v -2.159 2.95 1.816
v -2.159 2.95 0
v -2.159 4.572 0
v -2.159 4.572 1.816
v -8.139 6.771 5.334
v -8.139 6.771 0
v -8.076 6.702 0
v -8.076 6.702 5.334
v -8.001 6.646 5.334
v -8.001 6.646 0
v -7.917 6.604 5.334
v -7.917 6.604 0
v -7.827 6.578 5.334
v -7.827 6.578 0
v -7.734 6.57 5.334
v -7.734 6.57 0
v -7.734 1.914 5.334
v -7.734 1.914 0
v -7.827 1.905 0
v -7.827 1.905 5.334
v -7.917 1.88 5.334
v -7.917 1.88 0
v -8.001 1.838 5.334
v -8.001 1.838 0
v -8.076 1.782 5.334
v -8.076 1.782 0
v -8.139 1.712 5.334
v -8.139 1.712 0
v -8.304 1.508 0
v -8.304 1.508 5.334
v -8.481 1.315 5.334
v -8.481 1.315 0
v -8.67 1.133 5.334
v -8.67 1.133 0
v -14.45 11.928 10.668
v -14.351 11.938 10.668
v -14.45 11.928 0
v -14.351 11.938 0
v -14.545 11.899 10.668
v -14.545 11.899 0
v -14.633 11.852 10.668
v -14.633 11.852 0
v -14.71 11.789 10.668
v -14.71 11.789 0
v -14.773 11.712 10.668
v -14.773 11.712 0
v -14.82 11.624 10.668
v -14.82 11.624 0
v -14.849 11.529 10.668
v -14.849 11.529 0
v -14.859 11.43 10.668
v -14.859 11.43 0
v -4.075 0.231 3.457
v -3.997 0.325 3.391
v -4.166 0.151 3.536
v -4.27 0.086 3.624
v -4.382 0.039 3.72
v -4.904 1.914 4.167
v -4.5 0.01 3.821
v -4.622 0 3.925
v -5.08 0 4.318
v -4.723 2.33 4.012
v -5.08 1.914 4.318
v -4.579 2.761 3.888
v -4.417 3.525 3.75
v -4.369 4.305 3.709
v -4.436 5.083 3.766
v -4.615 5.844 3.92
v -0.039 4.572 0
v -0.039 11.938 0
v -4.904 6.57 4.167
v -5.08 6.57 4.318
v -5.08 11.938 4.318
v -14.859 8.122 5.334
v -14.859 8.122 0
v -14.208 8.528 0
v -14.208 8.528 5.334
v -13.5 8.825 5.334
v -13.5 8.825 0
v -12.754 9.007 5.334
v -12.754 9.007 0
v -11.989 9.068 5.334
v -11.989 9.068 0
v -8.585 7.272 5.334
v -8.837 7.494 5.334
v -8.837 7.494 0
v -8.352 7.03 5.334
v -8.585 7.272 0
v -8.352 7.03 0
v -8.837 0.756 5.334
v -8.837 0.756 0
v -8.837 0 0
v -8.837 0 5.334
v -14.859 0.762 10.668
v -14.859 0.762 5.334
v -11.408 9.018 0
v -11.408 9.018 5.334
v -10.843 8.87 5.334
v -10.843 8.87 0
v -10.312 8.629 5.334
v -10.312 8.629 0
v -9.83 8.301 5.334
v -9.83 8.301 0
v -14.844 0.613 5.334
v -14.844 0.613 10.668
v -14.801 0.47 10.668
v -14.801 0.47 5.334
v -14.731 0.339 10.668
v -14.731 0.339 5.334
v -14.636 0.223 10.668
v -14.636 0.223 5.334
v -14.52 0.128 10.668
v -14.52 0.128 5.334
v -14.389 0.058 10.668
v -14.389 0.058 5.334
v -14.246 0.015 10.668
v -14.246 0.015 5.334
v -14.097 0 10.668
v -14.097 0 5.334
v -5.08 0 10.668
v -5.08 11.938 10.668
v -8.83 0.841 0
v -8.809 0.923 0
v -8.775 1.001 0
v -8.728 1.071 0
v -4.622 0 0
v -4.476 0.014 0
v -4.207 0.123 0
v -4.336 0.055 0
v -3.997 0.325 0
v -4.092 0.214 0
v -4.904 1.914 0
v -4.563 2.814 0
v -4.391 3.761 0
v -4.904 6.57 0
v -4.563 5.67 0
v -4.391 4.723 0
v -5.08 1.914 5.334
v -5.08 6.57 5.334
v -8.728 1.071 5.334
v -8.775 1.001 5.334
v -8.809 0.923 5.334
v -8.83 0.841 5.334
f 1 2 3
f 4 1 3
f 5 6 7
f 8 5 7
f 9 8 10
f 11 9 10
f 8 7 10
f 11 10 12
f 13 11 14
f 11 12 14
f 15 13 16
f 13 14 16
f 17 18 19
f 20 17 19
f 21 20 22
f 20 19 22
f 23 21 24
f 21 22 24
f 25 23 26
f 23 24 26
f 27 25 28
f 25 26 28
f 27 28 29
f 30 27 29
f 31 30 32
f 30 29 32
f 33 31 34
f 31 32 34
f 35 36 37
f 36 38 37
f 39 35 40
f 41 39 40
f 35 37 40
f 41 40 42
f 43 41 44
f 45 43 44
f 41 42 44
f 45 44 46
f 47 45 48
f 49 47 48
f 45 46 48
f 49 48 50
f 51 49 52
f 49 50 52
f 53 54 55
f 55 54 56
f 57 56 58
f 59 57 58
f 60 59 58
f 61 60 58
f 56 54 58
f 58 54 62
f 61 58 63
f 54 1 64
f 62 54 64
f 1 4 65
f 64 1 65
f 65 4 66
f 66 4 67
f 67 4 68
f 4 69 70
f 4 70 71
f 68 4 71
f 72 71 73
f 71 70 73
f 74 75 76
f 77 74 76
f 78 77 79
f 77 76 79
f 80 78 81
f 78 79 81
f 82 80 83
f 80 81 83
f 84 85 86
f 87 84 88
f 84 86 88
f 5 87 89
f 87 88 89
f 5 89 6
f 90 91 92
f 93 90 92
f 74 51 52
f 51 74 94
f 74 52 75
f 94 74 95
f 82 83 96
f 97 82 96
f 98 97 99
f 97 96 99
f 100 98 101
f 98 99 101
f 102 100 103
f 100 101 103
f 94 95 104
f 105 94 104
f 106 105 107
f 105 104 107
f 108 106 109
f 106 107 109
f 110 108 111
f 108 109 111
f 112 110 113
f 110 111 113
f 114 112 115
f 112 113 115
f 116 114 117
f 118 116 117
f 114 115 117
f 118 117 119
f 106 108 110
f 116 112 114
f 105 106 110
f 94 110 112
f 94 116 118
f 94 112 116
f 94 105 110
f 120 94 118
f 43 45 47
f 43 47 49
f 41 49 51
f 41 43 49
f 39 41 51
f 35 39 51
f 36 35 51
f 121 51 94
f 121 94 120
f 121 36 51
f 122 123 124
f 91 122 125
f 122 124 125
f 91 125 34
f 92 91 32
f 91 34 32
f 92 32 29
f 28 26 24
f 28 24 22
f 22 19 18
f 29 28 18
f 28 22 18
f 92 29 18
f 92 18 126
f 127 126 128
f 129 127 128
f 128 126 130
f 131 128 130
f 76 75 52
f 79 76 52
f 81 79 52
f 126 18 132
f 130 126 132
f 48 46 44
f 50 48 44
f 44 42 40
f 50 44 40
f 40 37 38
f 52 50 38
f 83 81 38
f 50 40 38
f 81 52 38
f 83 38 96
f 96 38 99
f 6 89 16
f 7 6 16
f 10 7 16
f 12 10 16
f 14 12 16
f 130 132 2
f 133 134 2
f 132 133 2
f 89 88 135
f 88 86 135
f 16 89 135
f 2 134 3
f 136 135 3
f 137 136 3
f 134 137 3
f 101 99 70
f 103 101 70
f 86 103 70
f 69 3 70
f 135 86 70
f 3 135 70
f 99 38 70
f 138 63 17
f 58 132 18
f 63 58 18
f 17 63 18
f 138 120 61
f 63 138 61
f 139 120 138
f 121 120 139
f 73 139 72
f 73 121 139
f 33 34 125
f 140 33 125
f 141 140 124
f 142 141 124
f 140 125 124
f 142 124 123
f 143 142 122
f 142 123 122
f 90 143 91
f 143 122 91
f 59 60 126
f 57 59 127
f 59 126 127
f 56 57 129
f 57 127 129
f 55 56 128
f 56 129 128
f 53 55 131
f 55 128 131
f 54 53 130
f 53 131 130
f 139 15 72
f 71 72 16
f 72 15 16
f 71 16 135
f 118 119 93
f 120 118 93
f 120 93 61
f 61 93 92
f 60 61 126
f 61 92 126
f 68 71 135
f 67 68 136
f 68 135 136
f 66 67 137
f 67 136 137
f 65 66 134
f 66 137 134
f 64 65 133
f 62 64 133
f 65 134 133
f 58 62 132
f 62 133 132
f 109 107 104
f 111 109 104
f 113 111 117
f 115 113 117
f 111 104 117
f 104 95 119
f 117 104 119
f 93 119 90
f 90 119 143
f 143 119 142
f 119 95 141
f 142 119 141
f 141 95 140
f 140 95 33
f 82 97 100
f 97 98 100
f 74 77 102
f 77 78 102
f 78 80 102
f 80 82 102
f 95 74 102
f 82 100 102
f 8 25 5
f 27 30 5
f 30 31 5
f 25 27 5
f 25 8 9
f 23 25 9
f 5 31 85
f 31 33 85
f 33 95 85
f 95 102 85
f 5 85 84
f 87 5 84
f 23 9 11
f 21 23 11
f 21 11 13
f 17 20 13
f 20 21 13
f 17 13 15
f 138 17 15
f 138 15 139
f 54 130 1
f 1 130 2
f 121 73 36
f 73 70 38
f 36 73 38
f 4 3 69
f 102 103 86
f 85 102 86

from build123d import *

# Parameters (mm, degrees)
EXTRUDE1_DEPTH          = 4.7752
EXTRUDE2_DEPTH          = 12.938
SKETCH33_W              = 2.286
SKETCH33_H              = 5.588
EXTRUDE30_DEPTH         = 10.668
EXTRUDE3_DEPTH          = 3.0988
EXTRUDE6_DEPTH          = 3.0988
EXTRUDE7_DEPTH          = 3.0988
SKETCH23_W              = 3.0988
SKETCH23_H              = 1.133450424
EXTRUDE20_DEPTH         = 2.54
EXTRUDE16_DEPTH         = 3.0988
FILLET1_R               = 0.762
EXTRUDE21_DEPTH         = 3.0988
FILLET2_R               = 0.762
EXTRUDE28_DEPTH         = 8.0612
EXTRUDE29_REACH         = 9.061
FILLET3_R               = 0.762
FILLET4_R               = 0.508
FILLET5_R               = 0.508
FILLET6_R               = 0.508
SKETCH35_R              = 1.016
EXTRUDE32_DEPTH         = 8.0612
BOSS_EXTRUDE1_DEPTH     = 5.334
BOSS_EXTRUDE2_DEPTH     = 5.334
SKETCH39_W              = 7.76878052
SKETCH39_H              = 12.502157979
CUT_EXTRUDE1_DEPTH      = 15.8590001
SKETCH40_W              = 5.041406472
SKETCH40_H              = 6.35
SKETCH40_W_2            = 0.038593528
SKETCH40_H_2            = 4.318
CUT_EXTRUDE2_DEPTH      = 1.0000001
CUT_EXTRUDE2_DEPTH_BACK = 12.9380001


with BuildPart() as part:
    # Sketch1 → Extrude1 (new body)
    with BuildSketch(Plane.XY):
        Polygon((-14.859, 11.938), (0, 11.938), (0, 4.572), (-3.175, 4.572), (-3.175, 0), (-14.859, 0), align=None)
    extrude(amount=-EXTRUDE1_DEPTH)

    # Sketch2 → Extrude2 (cut, through all)
    with BuildSketch(Plane(origin=(0, 11.938, 0), x_dir=(1, 0, 0), z_dir=(0, 1, 0))):
        Polygon((0, 0.5842), (-4.191, 4.7752), (0, 4.7752), align=None)
    extrude(amount=-EXTRUDE2_DEPTH, mode=Mode.SUBTRACT)

    # Sketch33 → Extrude30 (add)
    with BuildSketch(Plane.ZY.offset(14.859)):
        with Locations((-5.9182, 9.144)):
            Rectangle(SKETCH33_W, SKETCH33_H)
    extrude(amount=-EXTRUDE30_DEPTH)

    # Sketch5 → Extrude3 (cut)
    with BuildSketch(Plane.XY):
        with BuildLine():
            Line((-14.859, 8.121520088), (-14.859, 0))
            Line((-14.859, 0), (-8.374207602, 0))
            ThreePointArc((-8.374207602, 0), (-5.258197931, 4.182323512), (-8.261178378, 8.44652973))
            ThreePointArc((-8.261178378, 8.44652973), (-10.099280239, 8.911418564), (-11.9888, 9.0678))
            ThreePointArc((-11.9888, 9.0678), (-13.499883528, 8.825128765), (-14.859, 8.121520088))
        make_face()
    extrude(amount=-EXTRUDE3_DEPTH, mode=Mode.SUBTRACT)

    # Sketch8 → Extrude6 (add)
    with BuildSketch(Plane.XY):
        with BuildLine():
            Line((-5.916117419, 6.569687461), (-7.995771884, 6.569687461))
            ThreePointArc((-7.995771884, 6.569687461), (-8.381805974, 7.063274265), (-8.837117419, 7.493787609))
            Line((-8.837117419, 7.493787609), (-8.837117419, 8.601687461))
            ThreePointArc((-8.837117419, 8.601687461), (-7.16441835, 7.890723622), (-5.916117419, 6.569687461))
        make_face()
    extrude(amount=-EXTRUDE6_DEPTH)

    # Sketch9 → Extrude7 (add)
    with BuildSketch(Plane.XY):
        with BuildLine():
            Line((-5.916117419, 1.913912539), (-7.995771884, 1.913912539))
            ThreePointArc((-7.995771884, 1.913912539), (-8.381805974, 1.420325735), (-8.837117419, 0.989812391))
            Line((-8.837117419, 0.989812391), (-8.837117419, 0))
            Line((-8.837117419, 0), (-8.374207602, 0))
            ThreePointArc((-8.374207602, 0), (-6.971998867, 0.734557469), (-5.916117419, 1.913912539))
        make_face()
    extrude(amount=-EXTRUDE7_DEPTH)

    # Sketch23 → Extrude20 (add)
    with BuildSketch(Plane.ZY.offset(8.837117419)):
        with Locations((-1.5494, 8.060512821)):
            Rectangle(SKETCH23_W, SKETCH23_H)
    extrude(amount=-EXTRUDE20_DEPTH)

    # Sketch18 → Extrude16 (cut)
    with BuildSketch(Plane.XY):
        with BuildLine():
            Line((-4.903581733, 6.569687461), (-5.916117419, 6.569687461))
            ThreePointArc((-5.916117419, 6.569687461), (-5.2578, 4.2418), (-5.916117419, 1.913912539))
            Line((-5.916117419, 1.913912539), (-4.903581733, 1.913912539))
            ThreePointArc((-4.903581733, 1.913912539), (-4.3688, 4.2418), (-4.903581733, 6.569687461))
        make_face()
    extrude(amount=-EXTRUDE16_DEPTH, mode=Mode.SUBTRACT)

    # Fillet1
    fillet1_edges = [part.edges().sort_by_distance(p)[0] for p in [
        (0, 8.255, -0.5842),
    ]]
    fillet(fillet1_edges, radius=FILLET1_R)

    # Sketch24 → Extrude21 (add)
    with BuildSketch(Plane.XY):
        with BuildLine():
            Line((-8.837117419, 7.493787609), (-9.830149409, 8.301066631))
            ThreePointArc((-9.830149409, 8.301066631), (-10.843412246, 8.870424655), (-11.9888, 9.0678))
            Line((-11.9888, 9.0678), (-8.837117419, 9.0678))
            Line((-8.837117419, 9.0678), (-8.837117419, 7.493787609))
        make_face()
    extrude(amount=-EXTRUDE21_DEPTH)

    # Fillet2
    fillet2_edges = [part.edges().sort_by_distance(p)[0] for p in [
        (-14.859, 0, -3.937),
    ]]
    fillet(fillet2_edges, radius=FILLET2_R)

    # Sketch31 → Extrude28 (cut, through all)
    with BuildSketch(Plane.XY):
        Polygon((-3.175, 1.499352844), (-4.224858164, 0), (-3.175, 0), align=None)
    extrude(amount=-EXTRUDE28_DEPTH, mode=Mode.SUBTRACT)

    # Extrude29: up to this face of the body (flat: up to its plane)
    extrude29_end = Plane(part.part.faces().sort_by_distance((-2.383005057, 7.601249614, -2.967205057))[0])
    # Sketch32 → Extrude29 (add, up to the picked face)
    with BuildSketch(Plane.XY, mode=Mode.PRIVATE) as extrude29_sk1:
        Polygon((-3.175, 1.499352844), (-2.159, 2.950351219), (-2.159, 4.572), (-3.175, 4.572), align=None)
    extrude29_tool1 = split(extrude(extrude29_sk1.sketch, amount=-EXTRUDE29_REACH, mode=Mode.PRIVATE), bisect_by=extrude29_end, keep=Keep.BOTH, mode=Mode.PRIVATE)
    add(extrude29_tool1.solids().sort_by_distance((-2.719341, 3.361051, 0))[0])

    # Fillet3
    fillet3_edges = [part.edges().sort_by_distance(p)[0] for p in [
        (-4.224858164, 0, -2.3876),
    ]]
    fillet(fillet3_edges, radius=FILLET3_R)

    # Fillet4
    fillet4_edges = [part.edges().sort_by_distance(p)[0] for p in [
        (-3.078168199, 1.637642987, 0),
        (-4.269677813, 0.086097745, 0),
        (-6.729323838, 0, 0),
    ]]
    fillet(fillet4_edges, radius=FILLET4_R)

    # Fillet5
    fillet5_edges = [part.edges().sort_by_distance(p)[0] for p in [
        (-9.525, 11.938, -7.0612),
        (-9.525, 6.35, -7.0612),
        (-7.4295, 11.938, 0),
        (-14.859, 11.938, -3.5306),
    ]]
    fillet(fillet5_edges, radius=FILLET5_R)

    # Fillet6
    fillet6_edges = [part.edges().sort_by_distance(p)[0] for p in [
        (-7.995771884, 6.569687461, -1.5494),
        (-8.837117419, 0.989812391, -1.5494),
        (-7.995771884, 1.913912539, -1.5494),
    ]]
    fillet(fillet6_edges, radius=FILLET6_R)

    # Sketch35 → Extrude32 (cut, through all)
    with BuildSketch(Plane.XY):
        with Locations((-6.731, 8.763)):
            Circle(SKETCH35_R)
    extrude(amount=-EXTRUDE32_DEPTH, mode=Mode.SUBTRACT)

    # Sketch37 → Boss-Extrude1 (add)
    with BuildSketch(Plane.XY):
        with BuildLine():
            Line((-8.837117419, 0.508), (-8.837117419, 0))
            Line((-8.837117419, 0), (-4.621530256, 0))
            ThreePointArc((-4.621530256, 0), (-4.269677813, 0.086097745), (-3.997336399, 0.324934756))
            Line((-3.997336399, 0.324934756), (-2.159, 2.950351219))
            Line((-2.159, 2.950351219), (-2.159, 3.836022191))
            Line((-2.159, 3.836022191), (-2.159, 4.572))
            Line((-2.159, 4.572), (0, 4.572))
            Line((0, 4.572), (0, 11.43))
            Line((0, 11.43), (0, 11.878036743))
            add(Edge.make_bspline(
                [(0, 11.878036743), (0, 11.918150491), (-0.011858122, 11.938), (-0.038593528, 11.938)],
                knots=[0, 0, 0, 0, 1, 1, 1, 1], degree=3))
            Line((-0.038593528, 11.938), (-14.351, 11.938))
            ThreePointArc((-14.351, 11.938), (-14.710210245, 11.789210245), (-14.859, 11.43))
            Line((-14.859, 11.43), (-14.859, 8.121520088))
            ThreePointArc((-14.859, 8.121520088), (-13.499883528, 8.825128765), (-11.9888, 9.0678))
            ThreePointArc((-11.9888, 9.0678), (-10.843412246, 8.870424655), (-9.830149409, 8.301066631))
            Line((-9.830149409, 8.301066631), (-8.837117419, 7.493787609))
            ThreePointArc((-8.837117419, 7.493787609), (-8.466362979, 7.153440508), (-8.139079327, 6.771105032))
            ThreePointArc((-8.139079327, 6.771105032), (-7.96020818, 6.622820517), (-7.734022276, 6.569687461))
            Line((-7.734022276, 6.569687461), (-4.903581733, 6.569687461))
            ThreePointArc((-4.903581733, 6.569687461), (-4.3688, 4.2418), (-4.903581733, 1.913912539))
            Line((-4.903581733, 1.913912539), (-7.734022276, 1.913912539))
            ThreePointArc((-7.734022276, 1.913912539), (-7.96020818, 1.860779483), (-8.139079327, 1.712494968))
            ThreePointArc((-8.139079327, 1.712494968), (-8.390857142, 1.410416216), (-8.66983986, 1.133265926))
            ThreePointArc((-8.66983986, 1.133265926), (-8.793418506, 0.962601304), (-8.837117419, 0.756473917))
            Line((-8.837117419, 0.756473917), (-8.837117419, 0.508))
        make_face()
    extrude(amount=BOSS_EXTRUDE1_DEPTH)

    # Sketch38 → Boss-Extrude2 (add)
    with BuildSketch(Plane.XY.offset(5.334)):
        with BuildLine():
            Line((-0.038593528, 11.938), (-14.351, 11.938))
            ThreePointArc((-14.351, 11.938), (-14.710210245, 11.789210245), (-14.859, 11.43))
            Line((-14.859, 11.43), (-14.859, 0.762))
            ThreePointArc((-14.859, 0.762), (-14.635815367, 0.223184633), (-14.097, 0))
            Line((-14.097, 0), (-4.621530256, 0))
            ThreePointArc((-4.621530256, 0), (-4.269677813, 0.086097745), (-3.997336399, 0.324934756))
            Line((-3.997336399, 0.324934756), (-2.159, 2.950351219))
            Line((-2.159, 2.950351219), (-2.159, 4.572))
            Line((-2.159, 4.572), (0, 4.572))
            Line((0, 4.572), (0, 11.878036743))
            add(Edge.make_bspline(
                [(0, 11.878036743), (0, 11.918150491), (-0.011858122, 11.938), (-0.038593528, 11.938)],
                knots=[0, 0, 0, 0, 1, 1, 1, 1], degree=3))
        make_face()
    extrude(amount=BOSS_EXTRUDE2_DEPTH)

    # Sketch39 → Cut-Extrude1 (cut, through all)
    with BuildSketch(Plane.ZY.offset(14.859)):
        with Locations((-3.88439026, 6.25107899)):
            Rectangle(SKETCH39_W, SKETCH39_H)
    extrude(amount=-CUT_EXTRUDE1_DEPTH, mode=Mode.SUBTRACT)

    # Sketch40 → Cut-Extrude2 (cut, two sides)
    with BuildSketch(Plane(origin=(0, 11.938, 0), x_dir=(1, 0, 0), z_dir=(0, 1, 0))) as cut_extrude2_sk:
        Polygon((-0.038593528, 0), (-5.08, -4.318), (-0.038593528, -4.318), align=None)
        with Locations((-2.559296764, -7.493)):
            Rectangle(SKETCH40_W, SKETCH40_H)
        with Locations((-0.019296764, -2.159)):
            Rectangle(SKETCH40_W_2, SKETCH40_H_2)
        with Locations((-0.019296764, -7.493)):
            Rectangle(SKETCH40_W_2, SKETCH40_H)
    extrude(amount=CUT_EXTRUDE2_DEPTH, mode=Mode.SUBTRACT)
    extrude(cut_extrude2_sk.sketch, amount=-CUT_EXTRUDE2_DEPTH_BACK, mode=Mode.SUBTRACT)


solid = part.part
